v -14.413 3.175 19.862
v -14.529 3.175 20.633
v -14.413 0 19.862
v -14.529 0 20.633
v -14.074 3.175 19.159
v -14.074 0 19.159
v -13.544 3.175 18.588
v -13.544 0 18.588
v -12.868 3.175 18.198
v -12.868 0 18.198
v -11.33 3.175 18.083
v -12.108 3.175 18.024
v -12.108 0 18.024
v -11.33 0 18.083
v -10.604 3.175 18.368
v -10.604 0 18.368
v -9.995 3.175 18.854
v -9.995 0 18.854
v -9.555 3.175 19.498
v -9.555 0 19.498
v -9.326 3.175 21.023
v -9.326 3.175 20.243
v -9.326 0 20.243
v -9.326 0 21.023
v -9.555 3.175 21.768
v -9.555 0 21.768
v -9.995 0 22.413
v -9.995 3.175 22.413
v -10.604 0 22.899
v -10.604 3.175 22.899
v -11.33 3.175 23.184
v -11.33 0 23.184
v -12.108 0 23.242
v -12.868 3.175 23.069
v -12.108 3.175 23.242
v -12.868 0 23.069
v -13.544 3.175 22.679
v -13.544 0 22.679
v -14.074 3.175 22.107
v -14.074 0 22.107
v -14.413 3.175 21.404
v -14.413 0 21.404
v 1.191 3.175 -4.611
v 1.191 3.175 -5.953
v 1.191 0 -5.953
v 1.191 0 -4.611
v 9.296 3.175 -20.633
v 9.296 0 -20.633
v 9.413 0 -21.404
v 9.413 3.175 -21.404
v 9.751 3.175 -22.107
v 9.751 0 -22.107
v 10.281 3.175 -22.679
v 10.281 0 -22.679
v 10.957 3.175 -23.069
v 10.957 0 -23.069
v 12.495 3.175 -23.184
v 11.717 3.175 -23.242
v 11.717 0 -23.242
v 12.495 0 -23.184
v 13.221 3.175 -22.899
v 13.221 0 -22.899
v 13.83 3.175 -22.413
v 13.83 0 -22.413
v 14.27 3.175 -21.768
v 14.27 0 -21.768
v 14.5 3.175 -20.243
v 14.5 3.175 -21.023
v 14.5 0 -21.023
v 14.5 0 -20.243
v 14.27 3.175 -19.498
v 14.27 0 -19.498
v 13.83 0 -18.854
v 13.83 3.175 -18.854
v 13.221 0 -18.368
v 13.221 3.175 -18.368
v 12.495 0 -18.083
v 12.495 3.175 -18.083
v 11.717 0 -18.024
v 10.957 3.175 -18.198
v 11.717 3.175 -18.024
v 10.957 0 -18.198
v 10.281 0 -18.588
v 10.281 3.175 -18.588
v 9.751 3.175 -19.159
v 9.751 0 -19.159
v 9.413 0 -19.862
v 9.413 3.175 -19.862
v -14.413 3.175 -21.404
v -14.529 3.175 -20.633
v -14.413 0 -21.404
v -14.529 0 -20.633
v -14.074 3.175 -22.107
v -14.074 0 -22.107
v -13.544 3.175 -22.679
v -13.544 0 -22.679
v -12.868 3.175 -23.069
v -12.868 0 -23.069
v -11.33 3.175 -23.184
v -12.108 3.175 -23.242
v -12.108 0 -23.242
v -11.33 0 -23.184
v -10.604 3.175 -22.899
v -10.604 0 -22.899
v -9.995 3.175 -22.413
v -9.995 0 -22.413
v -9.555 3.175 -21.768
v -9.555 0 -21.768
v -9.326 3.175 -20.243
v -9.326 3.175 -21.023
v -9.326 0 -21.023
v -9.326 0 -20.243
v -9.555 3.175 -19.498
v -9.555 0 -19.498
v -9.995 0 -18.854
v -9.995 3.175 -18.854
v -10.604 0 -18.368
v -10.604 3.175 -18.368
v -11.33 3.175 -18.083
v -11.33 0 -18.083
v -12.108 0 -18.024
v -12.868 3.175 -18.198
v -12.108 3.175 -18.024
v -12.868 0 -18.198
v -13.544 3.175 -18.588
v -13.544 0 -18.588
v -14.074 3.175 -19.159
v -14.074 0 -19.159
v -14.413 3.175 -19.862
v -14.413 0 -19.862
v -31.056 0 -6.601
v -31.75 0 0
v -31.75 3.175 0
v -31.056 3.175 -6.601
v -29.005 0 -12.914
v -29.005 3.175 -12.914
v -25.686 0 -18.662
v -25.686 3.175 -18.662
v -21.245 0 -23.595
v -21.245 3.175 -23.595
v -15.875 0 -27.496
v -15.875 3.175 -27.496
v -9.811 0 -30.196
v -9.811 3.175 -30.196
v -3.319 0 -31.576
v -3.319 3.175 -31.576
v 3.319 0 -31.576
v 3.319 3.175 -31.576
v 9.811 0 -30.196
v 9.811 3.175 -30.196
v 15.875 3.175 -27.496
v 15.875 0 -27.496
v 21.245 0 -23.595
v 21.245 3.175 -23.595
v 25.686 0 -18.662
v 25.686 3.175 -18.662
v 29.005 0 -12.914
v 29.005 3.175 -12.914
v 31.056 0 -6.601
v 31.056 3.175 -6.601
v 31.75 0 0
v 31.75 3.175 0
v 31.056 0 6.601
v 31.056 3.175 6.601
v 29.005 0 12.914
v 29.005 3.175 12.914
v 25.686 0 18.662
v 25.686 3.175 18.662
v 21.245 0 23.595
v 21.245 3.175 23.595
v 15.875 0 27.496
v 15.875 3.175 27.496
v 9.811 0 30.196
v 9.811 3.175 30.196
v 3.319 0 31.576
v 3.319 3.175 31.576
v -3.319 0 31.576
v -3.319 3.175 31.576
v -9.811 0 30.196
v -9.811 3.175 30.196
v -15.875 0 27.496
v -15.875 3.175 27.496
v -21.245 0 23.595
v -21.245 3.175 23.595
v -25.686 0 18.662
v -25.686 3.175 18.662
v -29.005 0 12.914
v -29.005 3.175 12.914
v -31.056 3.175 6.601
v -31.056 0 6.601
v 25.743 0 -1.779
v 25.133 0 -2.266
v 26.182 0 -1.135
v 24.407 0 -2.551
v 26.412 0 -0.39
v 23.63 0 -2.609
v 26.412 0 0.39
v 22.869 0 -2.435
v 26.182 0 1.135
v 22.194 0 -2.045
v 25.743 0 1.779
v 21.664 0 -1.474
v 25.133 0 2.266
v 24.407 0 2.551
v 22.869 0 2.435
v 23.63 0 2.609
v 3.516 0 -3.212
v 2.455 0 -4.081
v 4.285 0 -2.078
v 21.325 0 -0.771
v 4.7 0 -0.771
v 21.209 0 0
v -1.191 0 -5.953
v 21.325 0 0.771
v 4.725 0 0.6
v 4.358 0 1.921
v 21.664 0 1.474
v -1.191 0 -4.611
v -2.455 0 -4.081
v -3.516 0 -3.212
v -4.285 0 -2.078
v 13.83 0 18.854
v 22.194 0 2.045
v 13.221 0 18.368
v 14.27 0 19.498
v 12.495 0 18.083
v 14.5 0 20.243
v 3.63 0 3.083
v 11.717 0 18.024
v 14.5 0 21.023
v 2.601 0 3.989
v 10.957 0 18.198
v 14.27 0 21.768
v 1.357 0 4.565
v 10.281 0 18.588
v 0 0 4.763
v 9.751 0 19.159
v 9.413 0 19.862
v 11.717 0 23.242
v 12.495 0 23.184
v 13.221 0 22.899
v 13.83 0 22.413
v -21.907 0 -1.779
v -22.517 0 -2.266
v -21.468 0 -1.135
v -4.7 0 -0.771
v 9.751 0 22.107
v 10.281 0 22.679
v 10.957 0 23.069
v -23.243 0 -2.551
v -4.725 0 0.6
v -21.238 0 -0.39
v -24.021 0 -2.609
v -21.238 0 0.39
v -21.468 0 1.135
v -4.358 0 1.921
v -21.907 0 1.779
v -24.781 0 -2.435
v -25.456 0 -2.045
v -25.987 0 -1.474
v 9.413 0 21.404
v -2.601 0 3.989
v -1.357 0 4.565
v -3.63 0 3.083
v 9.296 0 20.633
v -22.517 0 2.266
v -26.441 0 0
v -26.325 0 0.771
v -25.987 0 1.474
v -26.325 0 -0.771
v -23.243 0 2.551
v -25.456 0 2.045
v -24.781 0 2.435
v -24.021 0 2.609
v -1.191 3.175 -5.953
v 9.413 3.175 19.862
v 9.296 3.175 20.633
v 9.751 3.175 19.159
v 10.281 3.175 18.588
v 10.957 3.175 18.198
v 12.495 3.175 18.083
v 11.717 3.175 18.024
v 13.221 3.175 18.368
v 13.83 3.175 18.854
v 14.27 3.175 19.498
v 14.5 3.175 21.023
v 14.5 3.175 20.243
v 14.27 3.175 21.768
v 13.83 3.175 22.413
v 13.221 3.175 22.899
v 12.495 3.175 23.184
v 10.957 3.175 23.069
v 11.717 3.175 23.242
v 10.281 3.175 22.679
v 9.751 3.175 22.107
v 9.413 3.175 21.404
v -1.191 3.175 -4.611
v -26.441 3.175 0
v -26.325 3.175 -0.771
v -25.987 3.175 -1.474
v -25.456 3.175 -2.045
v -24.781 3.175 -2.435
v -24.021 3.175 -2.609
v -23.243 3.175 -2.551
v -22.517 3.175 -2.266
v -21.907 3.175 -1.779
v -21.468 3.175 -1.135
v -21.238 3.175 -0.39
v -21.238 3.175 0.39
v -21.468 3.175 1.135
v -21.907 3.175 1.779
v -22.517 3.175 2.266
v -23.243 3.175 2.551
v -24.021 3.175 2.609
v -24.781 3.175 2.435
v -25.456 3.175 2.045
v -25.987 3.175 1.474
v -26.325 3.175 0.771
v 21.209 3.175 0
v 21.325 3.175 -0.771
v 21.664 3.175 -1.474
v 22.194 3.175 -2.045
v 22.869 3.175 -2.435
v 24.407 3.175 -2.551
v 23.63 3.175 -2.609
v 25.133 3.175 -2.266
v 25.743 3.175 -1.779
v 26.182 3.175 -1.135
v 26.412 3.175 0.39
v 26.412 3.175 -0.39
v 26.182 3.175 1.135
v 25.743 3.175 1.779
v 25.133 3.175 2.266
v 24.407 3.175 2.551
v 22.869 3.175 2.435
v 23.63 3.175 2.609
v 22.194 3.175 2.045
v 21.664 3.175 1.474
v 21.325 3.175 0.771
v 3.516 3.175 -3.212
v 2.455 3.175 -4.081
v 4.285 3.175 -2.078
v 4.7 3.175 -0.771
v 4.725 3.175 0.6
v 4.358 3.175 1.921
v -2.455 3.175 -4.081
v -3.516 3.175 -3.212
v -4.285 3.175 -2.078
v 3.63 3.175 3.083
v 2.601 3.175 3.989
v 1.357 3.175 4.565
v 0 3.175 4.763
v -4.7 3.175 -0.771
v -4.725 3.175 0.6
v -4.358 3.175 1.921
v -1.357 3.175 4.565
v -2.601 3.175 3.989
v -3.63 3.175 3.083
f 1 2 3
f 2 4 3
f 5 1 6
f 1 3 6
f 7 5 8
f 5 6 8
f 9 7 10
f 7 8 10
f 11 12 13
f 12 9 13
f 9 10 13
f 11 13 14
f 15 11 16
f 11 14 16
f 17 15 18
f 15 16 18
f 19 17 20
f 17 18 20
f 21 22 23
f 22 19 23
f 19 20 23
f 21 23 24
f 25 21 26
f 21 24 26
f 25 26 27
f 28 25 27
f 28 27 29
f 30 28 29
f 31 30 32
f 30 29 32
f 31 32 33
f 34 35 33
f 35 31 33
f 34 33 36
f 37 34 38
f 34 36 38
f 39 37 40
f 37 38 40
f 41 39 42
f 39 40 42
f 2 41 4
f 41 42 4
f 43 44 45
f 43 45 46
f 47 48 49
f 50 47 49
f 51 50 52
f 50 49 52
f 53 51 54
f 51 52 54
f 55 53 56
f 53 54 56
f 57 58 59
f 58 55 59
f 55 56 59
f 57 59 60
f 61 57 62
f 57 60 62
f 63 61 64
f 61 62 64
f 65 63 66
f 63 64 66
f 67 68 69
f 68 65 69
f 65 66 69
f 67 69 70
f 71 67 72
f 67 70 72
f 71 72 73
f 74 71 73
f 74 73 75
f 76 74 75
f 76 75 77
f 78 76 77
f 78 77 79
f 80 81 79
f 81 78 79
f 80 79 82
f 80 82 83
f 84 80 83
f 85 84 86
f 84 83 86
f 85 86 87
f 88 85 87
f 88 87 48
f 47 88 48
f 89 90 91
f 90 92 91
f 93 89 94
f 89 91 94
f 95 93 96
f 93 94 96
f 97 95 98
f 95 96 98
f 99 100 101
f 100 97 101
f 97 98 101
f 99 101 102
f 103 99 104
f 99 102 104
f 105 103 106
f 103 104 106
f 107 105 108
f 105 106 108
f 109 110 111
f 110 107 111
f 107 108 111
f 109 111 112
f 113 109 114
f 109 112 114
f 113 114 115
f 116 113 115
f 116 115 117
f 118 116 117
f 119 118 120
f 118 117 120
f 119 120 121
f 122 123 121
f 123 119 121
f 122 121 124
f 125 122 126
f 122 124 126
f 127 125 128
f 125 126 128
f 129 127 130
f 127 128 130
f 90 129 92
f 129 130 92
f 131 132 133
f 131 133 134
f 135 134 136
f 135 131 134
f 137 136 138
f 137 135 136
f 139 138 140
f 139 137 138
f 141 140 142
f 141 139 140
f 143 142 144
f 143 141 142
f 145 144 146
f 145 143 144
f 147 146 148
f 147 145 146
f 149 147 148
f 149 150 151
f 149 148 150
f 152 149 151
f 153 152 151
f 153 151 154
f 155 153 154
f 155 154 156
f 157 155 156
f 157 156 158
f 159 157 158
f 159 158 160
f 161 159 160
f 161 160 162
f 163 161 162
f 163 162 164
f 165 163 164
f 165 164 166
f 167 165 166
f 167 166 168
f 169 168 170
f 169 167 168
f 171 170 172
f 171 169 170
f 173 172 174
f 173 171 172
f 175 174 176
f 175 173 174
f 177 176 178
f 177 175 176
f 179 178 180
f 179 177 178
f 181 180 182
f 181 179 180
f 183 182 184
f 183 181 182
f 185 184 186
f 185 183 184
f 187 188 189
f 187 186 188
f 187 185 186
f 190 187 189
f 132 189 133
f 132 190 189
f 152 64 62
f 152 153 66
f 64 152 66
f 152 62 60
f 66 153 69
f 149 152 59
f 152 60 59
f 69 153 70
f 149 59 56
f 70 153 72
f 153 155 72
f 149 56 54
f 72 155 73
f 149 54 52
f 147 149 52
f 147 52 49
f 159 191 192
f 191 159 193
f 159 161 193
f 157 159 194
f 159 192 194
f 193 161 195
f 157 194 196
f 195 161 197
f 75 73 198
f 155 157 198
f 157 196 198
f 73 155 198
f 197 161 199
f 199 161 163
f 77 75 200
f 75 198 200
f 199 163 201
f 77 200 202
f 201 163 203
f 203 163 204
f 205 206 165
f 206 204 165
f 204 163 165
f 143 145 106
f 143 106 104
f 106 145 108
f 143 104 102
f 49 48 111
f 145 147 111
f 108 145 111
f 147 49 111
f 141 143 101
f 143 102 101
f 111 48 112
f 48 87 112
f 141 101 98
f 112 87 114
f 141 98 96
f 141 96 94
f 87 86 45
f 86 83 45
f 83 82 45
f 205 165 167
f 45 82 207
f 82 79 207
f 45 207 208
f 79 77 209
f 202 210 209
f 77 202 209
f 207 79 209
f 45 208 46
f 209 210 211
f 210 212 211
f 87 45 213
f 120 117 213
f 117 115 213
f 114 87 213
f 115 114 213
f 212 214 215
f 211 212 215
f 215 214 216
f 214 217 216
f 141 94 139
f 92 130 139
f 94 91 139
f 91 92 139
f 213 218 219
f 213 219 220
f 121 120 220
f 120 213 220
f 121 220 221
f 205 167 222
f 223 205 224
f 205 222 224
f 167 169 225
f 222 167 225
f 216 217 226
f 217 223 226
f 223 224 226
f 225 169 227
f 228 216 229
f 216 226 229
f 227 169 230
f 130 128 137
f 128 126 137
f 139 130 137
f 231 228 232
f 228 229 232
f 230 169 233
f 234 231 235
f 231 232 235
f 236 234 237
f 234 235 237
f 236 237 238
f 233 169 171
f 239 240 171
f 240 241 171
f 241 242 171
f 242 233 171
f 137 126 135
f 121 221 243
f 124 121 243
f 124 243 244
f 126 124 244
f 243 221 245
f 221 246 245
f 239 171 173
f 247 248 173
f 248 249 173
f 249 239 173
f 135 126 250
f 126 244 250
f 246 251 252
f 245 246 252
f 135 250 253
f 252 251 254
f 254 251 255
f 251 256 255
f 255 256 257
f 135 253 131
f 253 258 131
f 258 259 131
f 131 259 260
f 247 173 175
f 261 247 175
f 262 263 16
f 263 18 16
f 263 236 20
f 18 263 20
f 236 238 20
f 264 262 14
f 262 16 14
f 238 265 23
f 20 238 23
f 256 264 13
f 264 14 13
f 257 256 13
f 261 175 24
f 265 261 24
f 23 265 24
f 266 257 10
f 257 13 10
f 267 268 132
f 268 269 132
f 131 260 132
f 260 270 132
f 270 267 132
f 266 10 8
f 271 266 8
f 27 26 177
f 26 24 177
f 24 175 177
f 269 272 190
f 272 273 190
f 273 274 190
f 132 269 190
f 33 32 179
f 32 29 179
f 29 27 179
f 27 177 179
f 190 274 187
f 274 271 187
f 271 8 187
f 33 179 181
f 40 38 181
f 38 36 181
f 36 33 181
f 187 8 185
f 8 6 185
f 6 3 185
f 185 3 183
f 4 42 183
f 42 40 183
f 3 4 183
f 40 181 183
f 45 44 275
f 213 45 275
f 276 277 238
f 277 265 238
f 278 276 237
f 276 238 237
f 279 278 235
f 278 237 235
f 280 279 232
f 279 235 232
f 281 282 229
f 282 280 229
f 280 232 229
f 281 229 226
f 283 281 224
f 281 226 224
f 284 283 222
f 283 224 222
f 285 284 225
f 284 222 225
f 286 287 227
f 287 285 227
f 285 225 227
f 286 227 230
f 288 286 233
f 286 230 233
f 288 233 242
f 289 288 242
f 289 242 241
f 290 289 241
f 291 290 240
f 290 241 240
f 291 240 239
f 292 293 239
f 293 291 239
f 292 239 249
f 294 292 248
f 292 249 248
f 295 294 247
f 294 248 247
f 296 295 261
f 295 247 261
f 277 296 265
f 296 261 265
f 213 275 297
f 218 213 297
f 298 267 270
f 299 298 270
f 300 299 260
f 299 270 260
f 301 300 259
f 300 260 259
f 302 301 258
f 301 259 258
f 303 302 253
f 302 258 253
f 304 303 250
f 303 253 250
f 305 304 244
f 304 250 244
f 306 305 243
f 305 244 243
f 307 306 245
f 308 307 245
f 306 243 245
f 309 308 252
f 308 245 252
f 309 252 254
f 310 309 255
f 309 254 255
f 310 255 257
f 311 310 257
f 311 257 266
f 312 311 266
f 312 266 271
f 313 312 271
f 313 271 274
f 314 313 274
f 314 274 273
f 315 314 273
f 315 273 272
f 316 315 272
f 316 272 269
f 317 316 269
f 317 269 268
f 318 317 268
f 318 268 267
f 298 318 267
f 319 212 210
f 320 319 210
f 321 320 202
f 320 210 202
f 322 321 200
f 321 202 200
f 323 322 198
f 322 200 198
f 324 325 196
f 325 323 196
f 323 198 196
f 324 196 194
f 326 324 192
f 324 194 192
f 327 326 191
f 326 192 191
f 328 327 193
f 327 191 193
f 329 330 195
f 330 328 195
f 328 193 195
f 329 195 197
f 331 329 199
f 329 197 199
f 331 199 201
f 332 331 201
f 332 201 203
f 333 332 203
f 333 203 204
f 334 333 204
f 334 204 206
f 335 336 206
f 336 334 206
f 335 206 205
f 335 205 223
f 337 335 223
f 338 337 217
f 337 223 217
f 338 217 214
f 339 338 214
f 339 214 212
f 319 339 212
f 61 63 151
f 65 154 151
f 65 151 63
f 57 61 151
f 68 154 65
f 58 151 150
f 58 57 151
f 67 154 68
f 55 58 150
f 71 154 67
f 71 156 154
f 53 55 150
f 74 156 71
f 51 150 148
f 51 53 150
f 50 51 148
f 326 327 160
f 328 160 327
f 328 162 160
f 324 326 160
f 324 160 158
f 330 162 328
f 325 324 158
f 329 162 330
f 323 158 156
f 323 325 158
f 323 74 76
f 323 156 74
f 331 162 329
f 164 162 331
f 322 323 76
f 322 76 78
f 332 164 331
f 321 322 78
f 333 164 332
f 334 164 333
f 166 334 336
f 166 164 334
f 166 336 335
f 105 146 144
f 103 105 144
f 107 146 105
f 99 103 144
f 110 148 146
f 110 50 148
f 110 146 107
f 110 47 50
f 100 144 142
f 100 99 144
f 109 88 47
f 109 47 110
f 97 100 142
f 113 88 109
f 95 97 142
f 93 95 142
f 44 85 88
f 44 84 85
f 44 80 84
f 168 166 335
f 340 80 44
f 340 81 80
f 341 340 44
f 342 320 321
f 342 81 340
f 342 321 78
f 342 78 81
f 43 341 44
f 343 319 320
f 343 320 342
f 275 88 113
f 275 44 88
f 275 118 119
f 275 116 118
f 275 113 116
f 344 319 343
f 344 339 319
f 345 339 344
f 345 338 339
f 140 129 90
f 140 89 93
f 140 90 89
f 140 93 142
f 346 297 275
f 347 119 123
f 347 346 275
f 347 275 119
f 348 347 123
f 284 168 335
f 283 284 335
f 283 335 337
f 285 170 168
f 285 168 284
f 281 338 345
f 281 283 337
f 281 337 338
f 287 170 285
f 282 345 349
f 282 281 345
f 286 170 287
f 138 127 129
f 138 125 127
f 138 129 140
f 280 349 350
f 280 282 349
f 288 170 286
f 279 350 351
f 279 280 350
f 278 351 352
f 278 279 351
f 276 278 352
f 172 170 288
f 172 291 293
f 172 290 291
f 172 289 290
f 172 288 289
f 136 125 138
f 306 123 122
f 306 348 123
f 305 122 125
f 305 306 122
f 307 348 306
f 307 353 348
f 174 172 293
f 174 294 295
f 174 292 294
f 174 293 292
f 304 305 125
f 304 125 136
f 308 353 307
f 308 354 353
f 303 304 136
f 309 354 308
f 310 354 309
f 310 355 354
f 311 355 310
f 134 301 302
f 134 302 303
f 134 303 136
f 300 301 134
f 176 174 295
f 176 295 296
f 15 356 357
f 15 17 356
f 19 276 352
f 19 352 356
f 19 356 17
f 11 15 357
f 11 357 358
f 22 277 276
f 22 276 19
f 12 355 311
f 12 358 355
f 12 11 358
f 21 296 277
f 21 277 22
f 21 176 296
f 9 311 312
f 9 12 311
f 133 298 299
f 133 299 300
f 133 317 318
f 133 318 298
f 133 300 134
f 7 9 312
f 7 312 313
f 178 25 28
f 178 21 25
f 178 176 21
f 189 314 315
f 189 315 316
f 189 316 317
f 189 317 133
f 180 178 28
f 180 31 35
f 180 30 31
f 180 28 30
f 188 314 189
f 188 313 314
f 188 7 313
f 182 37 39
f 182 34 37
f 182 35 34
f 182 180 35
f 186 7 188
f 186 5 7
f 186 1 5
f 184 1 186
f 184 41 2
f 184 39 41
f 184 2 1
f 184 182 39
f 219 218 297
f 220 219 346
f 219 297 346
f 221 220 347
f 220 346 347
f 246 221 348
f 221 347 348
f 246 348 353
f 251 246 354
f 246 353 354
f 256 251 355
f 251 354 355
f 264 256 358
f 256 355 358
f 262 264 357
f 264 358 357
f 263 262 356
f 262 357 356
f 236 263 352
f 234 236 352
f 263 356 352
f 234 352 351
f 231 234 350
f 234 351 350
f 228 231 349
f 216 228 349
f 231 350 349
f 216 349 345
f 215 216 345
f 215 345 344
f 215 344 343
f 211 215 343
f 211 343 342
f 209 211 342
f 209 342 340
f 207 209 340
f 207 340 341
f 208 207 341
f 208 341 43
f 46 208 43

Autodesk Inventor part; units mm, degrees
ref_plane "YZ Plane" through (0, 0, 0) normal (1, 0, 0) x (0, 1, 0)
ref_plane "XZ Plane" through (0, 0, 0) normal (0, 1, 0) x (-1, 0, 0)
ref_plane "XY Plane" through (0, 0, 0) normal (0, 0, 1) x (1, 0, 0)
sketch "Sketch1" plane through (0, 0, 0) normal (0, 1, 0) x (-1, 0, 0)
  circle A0 centre (0, 0) radius 31.75
  line L0 (0, 0) -> (23.8252, 0)
  circle A1 centre (23.8252, 0) radius 2.6162
  circle A2 centre (11.9126, 20.6332) radius 2.6162
  circle A3 centre (-11.9126, 20.6332) radius 2.6162
  circle A4 centre (-23.8252, 0) radius 2.6162
  circle A5 centre (-11.9126, -20.6332) radius 2.6162
  circle A6 centre (11.9126, -20.6332) radius 2.6162
  dimension "d0" = 63.5
  dimension "d1" = 23.8252
  dimension "d2" = 5.2324
  dimension "d5" = 360
extrude "Plate1" add sketch "Sketch1" along normal blind 3.175
sketch "Sketch2" plane through (0, 3.175, 0) normal (0, 1, 0) x (1, 0, 0)
  circle A0 centre (0, 0) radius 31.75 projected
  circle A1 centre (0, 0) radius 4.7625
  line L0 (0, 4.7625) -> (0, 4.2799)
  line L1 (1.1906, 4.2799) -> (1.1906, 4.6113)
  line L2 (-1.1906, 4.2799) -> (-1.1906, 4.6113)
  line L3 (0, 4.7625) -> (0, 5.9531)
  line L4 (0, 5.9531) -> (1.1906, 5.9531)
  line L5 (1.1906, 5.9531) -> (1.1906, 4.6113)
  line L6 (0, 5.9531) -> (-1.1906, 5.9531)
  line L7 (-1.1906, 5.9531) -> (-1.1906, 4.6113)
  dimension "d8" = 9.525
  dimension "d9" = 0.4826
  dimension "d10" = 1.1906
  dimension "d11" = 2.3813
  dimension "d12" = 1.1906
extrude "Cut1" cut sketch "Sketch2" against normal blind 3.175 contours A1 | A1 L3 L4 L5 | L7 L6 L3 A1
equation "\"d13\" = Thickness"
equation "\"BendRadius\" = Thickness"
equation "\"BendReliefWidth\" = Thickness"
equation "\"BendReliefDepth\" = 0.5 * Thickness"
equation "\"CornerReliefSize\" = 4 * Thickness"
equation "\"MinimumRemnant\" = 2 * Thickness"
equation "\"TransitionRadius\" = BendRadius"
equation "\"JacobiRadiusSize\" = BendRadius"
equation "\"GapSize\" = Thickness"
equation "\"d7\" = BendRadius"
equation "\"Thickness\" = 3.175"
properties part number "Fitting piece for Sprocket"
